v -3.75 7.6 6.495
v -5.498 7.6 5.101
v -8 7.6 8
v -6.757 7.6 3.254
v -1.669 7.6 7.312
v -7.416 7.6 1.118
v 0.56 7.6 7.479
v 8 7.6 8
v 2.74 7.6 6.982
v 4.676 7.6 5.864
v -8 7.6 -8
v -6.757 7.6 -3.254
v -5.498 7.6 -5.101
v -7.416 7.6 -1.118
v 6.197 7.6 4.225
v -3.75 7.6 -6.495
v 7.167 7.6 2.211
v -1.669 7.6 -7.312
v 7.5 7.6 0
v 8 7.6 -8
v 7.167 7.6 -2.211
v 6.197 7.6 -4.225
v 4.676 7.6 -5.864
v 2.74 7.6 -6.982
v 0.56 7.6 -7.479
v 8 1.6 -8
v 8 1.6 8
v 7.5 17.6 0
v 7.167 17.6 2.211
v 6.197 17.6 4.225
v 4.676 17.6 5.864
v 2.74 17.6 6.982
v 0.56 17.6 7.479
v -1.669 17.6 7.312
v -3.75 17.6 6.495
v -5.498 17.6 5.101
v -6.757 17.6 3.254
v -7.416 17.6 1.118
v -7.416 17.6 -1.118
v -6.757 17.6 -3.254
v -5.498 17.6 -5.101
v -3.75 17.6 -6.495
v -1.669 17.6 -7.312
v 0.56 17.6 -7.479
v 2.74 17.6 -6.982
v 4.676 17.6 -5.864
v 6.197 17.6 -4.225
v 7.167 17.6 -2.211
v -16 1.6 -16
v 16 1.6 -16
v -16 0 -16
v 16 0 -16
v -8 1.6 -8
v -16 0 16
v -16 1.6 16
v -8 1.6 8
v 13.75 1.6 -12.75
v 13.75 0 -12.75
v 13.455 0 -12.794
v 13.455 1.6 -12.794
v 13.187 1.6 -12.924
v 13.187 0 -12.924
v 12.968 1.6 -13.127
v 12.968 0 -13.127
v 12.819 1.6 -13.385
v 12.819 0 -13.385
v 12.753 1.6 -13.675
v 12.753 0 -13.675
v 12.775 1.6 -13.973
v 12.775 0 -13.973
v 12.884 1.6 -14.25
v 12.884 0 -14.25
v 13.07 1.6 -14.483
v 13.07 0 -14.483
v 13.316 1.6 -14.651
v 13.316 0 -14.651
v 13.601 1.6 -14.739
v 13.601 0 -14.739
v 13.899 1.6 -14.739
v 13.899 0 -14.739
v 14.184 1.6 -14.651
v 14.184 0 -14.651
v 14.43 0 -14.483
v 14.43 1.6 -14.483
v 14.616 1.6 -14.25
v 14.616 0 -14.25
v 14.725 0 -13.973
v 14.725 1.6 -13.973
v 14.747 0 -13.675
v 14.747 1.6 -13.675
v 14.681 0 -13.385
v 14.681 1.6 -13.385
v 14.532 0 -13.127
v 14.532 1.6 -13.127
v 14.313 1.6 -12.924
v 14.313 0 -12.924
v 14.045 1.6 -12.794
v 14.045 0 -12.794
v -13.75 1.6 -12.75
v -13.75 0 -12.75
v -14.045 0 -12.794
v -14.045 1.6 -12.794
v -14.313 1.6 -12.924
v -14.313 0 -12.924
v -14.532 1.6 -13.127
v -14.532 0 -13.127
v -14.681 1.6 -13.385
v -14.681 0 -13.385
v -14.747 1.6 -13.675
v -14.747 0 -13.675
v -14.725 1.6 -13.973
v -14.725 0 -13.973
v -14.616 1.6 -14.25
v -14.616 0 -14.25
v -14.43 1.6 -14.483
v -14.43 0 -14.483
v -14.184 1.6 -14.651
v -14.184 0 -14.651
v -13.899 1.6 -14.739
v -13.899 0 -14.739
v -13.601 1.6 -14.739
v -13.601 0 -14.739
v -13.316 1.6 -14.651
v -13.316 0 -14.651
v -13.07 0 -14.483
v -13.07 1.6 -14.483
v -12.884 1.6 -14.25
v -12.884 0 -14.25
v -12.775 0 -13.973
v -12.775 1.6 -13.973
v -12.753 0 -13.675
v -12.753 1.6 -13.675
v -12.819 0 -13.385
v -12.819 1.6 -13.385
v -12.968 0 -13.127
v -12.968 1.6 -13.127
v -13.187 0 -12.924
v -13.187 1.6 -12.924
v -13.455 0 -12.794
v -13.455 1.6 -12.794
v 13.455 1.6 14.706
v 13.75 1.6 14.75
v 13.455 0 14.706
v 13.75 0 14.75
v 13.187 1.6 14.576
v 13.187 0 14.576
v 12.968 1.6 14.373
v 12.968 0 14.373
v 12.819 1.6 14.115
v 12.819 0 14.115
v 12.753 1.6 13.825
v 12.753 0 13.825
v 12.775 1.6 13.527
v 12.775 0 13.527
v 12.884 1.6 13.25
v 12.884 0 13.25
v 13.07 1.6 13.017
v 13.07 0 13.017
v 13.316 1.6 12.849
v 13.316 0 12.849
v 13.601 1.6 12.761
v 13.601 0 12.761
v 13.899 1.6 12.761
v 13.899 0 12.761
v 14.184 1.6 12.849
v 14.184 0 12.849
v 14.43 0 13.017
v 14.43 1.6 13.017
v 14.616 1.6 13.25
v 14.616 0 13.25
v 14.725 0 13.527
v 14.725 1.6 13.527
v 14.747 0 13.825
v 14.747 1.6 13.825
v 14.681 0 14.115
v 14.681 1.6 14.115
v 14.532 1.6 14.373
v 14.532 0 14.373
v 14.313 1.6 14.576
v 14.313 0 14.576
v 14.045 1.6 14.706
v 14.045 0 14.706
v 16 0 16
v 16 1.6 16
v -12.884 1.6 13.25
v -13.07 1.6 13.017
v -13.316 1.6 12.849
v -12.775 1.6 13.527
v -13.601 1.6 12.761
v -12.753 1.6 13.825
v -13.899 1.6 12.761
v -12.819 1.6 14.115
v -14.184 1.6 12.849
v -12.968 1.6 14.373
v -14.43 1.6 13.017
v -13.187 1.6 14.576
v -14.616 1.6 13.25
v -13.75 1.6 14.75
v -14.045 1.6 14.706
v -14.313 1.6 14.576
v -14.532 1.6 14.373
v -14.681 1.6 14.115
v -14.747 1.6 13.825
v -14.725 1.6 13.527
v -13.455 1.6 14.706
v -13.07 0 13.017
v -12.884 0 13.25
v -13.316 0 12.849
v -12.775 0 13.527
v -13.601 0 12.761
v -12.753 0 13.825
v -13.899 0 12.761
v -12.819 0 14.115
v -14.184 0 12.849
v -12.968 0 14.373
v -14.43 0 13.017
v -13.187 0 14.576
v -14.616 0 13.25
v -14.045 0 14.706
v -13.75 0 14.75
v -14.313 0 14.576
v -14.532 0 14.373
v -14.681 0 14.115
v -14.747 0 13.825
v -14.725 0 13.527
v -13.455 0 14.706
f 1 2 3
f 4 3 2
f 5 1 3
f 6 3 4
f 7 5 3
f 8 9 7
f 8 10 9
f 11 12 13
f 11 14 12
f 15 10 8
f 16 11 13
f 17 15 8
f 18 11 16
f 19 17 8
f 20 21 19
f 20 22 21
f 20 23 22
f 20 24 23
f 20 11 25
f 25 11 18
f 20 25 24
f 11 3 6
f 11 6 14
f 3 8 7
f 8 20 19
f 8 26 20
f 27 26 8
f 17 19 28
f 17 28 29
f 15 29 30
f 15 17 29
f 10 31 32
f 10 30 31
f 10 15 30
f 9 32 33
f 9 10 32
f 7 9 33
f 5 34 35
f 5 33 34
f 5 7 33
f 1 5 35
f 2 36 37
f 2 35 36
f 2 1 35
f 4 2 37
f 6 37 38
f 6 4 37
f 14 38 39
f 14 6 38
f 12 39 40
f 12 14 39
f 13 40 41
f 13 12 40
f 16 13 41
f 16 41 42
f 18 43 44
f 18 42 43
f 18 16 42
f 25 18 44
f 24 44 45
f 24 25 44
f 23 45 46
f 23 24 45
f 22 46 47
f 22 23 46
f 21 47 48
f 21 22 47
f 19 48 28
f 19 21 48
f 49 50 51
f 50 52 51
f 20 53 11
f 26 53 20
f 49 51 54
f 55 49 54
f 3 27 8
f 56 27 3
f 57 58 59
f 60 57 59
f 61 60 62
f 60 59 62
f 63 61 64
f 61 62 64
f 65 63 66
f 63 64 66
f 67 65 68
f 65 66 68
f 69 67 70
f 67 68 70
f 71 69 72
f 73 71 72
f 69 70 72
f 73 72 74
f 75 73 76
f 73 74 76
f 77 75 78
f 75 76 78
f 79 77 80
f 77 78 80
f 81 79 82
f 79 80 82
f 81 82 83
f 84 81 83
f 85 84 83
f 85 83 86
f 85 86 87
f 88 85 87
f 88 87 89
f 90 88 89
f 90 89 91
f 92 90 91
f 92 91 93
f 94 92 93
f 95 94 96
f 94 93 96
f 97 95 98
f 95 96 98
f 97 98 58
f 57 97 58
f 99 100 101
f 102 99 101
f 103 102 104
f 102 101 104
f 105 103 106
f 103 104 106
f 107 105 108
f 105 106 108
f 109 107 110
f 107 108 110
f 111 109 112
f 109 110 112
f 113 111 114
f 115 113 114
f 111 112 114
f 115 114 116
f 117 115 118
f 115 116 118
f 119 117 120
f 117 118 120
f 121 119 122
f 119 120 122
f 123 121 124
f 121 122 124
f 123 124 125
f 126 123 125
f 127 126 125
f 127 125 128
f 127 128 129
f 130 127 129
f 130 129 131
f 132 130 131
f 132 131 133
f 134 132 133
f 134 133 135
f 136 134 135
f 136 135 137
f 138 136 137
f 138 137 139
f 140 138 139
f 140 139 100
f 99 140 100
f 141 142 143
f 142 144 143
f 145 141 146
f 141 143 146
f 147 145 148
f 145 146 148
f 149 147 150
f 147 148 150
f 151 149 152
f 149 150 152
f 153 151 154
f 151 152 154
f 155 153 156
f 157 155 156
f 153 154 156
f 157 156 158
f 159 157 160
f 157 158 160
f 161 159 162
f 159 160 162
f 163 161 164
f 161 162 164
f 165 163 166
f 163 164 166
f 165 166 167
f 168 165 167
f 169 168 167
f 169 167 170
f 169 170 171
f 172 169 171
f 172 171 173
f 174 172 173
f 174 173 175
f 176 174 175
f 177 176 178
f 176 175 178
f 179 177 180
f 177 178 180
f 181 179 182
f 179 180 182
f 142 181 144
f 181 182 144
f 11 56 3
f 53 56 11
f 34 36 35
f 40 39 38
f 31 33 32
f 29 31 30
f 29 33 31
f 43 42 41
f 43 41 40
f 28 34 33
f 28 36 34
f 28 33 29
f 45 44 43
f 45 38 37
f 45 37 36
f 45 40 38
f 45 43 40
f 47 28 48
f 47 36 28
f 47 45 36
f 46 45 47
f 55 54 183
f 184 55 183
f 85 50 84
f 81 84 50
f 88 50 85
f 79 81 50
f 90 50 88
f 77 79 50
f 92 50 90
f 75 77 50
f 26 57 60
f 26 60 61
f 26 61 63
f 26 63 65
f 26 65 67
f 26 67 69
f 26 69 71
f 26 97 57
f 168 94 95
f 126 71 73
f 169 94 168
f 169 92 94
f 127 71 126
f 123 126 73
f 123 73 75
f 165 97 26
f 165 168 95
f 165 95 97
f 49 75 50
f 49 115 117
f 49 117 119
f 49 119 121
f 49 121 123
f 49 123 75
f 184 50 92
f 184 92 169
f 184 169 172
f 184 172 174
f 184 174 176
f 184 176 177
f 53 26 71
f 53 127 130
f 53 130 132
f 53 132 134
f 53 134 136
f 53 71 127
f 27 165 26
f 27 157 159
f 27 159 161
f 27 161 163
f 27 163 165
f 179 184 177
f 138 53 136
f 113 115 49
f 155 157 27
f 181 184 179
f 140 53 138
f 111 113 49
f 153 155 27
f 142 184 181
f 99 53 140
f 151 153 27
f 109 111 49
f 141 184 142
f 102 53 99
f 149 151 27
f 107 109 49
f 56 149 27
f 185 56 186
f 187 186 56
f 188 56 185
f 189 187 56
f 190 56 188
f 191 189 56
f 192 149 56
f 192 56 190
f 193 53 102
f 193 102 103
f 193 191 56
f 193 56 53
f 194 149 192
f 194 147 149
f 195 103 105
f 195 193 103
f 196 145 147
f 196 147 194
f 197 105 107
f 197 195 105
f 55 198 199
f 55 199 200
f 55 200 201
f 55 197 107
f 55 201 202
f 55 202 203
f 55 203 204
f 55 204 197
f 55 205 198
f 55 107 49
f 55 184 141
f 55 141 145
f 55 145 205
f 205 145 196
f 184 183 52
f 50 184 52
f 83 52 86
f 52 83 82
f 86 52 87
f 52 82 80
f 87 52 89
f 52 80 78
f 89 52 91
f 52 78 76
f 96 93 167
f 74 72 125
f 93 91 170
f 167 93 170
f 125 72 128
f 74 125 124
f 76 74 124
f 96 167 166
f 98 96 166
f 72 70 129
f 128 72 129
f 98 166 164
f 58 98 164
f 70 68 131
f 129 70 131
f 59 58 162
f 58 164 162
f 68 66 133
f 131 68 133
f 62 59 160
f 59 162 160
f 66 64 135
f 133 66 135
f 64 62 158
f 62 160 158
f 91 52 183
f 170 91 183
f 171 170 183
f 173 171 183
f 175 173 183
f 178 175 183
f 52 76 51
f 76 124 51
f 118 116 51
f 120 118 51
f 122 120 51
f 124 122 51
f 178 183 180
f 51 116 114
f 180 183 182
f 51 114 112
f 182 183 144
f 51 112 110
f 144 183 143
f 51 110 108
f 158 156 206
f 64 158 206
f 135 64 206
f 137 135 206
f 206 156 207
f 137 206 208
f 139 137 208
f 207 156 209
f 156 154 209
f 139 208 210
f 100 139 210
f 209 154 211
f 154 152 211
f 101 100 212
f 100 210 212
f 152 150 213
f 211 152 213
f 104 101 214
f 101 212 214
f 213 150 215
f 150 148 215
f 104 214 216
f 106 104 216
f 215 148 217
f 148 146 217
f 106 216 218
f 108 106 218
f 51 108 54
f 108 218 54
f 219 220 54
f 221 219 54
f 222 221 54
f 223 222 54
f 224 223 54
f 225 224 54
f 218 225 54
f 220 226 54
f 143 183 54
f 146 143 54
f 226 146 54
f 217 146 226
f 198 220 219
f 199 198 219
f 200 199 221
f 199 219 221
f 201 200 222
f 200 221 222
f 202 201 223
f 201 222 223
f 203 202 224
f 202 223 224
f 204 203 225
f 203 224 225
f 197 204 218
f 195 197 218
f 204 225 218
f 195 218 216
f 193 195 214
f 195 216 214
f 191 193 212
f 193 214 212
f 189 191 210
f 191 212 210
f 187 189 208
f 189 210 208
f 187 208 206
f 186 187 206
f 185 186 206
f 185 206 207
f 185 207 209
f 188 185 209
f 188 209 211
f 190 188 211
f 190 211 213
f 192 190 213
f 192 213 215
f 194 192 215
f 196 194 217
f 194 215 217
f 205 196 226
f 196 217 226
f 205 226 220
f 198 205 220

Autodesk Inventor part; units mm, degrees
ref_plane "YZ Plane" through (0, 0, 0) normal (1, 0, 0) x (0, 1, 0)
ref_plane "XZ Plane" through (0, 0, 0) normal (0, 1, 0) x (-1, 0, 0)
ref_plane "XY Plane" through (0, 0, 0) normal (0, 0, 1) x (1, 0, 0)
sketch "Sketch1" plane through (0, 0, 0) normal (0, 1, 0) x (-1, 0, 0)
  line L0 (-16, 16) -> (-16, -16)
  line L1 (-16, -16) -> (16, -16)
  line L2 (16, -16) -> (16, 16)
  line L3 (16, 16) -> (-16, 16)
  line L4 (-16, 16) -> (16, -16) construction
  line L5 (-16, -16) -> (16, 16) construction
  point P0 (0, 0)
  dimension "d0" = 32
  dimension "d1" = 32
extrude "Extrusion1" add sketch "Sketch1" along normal blind 1.6
sketch "Sketch2" plane through (0, 1.6, 0) normal (0, 1, 0) x (1, 0, 0)
  line L0 (-8, -8) -> (-8, 8)
  line L1 (-8, 8) -> (8, 8)
  line L2 (8, 8) -> (8, -8)
  line L3 (8, -8) -> (-8, -8)
  line L4 (-8, -8) -> (8, 8) construction
  line L5 (-8, 8) -> (8, -8) construction
  point P0 (0, 0)
  dimension "d4" = 16
  dimension "d5" = 16
extrude "Extrusion2" add sketch "Sketch2" along normal blind 6
sketch "Sketch3" plane through (0, 7.6, 0) normal (0, 1, 0) x (1, 0, 0)
  circle A0 centre (0, 0) radius 7.5
  dimension "d8" = 15
extrude "Extrusion3" add sketch "Sketch3" along normal blind 10
sketch "Sketch4" plane through (0, 1.6, 0) normal (0, 1, 0) x (1, 0, 0)
  line L0 (-13.75, -13.75) -> (-13.75, 13.75)
  line L1 (-13.75, 13.75) -> (13.75, 13.75)
  line L2 (13.75, 13.75) -> (13.75, -13.75)
  line L3 (13.75, -13.75) -> (-13.75, -13.75)
  line L4 (-13.75, -13.75) -> (13.75, 13.75) construction
  line L5 (-13.75, 13.75) -> (13.75, -13.75) construction
  point P0 (0, 0)
  dimension "d11" = 27.5
  dimension "d12" = 27.5
hole "Hole1" at (-13.75, 1.6, 13.75) at (13.75, 1.6, 13.75) at (13.75, 1.6, -13.75) at (-13.75, 1.6, -13.75) direction (0, -1, 0) diameter 2 depth 7
properties part number "cam_1"
